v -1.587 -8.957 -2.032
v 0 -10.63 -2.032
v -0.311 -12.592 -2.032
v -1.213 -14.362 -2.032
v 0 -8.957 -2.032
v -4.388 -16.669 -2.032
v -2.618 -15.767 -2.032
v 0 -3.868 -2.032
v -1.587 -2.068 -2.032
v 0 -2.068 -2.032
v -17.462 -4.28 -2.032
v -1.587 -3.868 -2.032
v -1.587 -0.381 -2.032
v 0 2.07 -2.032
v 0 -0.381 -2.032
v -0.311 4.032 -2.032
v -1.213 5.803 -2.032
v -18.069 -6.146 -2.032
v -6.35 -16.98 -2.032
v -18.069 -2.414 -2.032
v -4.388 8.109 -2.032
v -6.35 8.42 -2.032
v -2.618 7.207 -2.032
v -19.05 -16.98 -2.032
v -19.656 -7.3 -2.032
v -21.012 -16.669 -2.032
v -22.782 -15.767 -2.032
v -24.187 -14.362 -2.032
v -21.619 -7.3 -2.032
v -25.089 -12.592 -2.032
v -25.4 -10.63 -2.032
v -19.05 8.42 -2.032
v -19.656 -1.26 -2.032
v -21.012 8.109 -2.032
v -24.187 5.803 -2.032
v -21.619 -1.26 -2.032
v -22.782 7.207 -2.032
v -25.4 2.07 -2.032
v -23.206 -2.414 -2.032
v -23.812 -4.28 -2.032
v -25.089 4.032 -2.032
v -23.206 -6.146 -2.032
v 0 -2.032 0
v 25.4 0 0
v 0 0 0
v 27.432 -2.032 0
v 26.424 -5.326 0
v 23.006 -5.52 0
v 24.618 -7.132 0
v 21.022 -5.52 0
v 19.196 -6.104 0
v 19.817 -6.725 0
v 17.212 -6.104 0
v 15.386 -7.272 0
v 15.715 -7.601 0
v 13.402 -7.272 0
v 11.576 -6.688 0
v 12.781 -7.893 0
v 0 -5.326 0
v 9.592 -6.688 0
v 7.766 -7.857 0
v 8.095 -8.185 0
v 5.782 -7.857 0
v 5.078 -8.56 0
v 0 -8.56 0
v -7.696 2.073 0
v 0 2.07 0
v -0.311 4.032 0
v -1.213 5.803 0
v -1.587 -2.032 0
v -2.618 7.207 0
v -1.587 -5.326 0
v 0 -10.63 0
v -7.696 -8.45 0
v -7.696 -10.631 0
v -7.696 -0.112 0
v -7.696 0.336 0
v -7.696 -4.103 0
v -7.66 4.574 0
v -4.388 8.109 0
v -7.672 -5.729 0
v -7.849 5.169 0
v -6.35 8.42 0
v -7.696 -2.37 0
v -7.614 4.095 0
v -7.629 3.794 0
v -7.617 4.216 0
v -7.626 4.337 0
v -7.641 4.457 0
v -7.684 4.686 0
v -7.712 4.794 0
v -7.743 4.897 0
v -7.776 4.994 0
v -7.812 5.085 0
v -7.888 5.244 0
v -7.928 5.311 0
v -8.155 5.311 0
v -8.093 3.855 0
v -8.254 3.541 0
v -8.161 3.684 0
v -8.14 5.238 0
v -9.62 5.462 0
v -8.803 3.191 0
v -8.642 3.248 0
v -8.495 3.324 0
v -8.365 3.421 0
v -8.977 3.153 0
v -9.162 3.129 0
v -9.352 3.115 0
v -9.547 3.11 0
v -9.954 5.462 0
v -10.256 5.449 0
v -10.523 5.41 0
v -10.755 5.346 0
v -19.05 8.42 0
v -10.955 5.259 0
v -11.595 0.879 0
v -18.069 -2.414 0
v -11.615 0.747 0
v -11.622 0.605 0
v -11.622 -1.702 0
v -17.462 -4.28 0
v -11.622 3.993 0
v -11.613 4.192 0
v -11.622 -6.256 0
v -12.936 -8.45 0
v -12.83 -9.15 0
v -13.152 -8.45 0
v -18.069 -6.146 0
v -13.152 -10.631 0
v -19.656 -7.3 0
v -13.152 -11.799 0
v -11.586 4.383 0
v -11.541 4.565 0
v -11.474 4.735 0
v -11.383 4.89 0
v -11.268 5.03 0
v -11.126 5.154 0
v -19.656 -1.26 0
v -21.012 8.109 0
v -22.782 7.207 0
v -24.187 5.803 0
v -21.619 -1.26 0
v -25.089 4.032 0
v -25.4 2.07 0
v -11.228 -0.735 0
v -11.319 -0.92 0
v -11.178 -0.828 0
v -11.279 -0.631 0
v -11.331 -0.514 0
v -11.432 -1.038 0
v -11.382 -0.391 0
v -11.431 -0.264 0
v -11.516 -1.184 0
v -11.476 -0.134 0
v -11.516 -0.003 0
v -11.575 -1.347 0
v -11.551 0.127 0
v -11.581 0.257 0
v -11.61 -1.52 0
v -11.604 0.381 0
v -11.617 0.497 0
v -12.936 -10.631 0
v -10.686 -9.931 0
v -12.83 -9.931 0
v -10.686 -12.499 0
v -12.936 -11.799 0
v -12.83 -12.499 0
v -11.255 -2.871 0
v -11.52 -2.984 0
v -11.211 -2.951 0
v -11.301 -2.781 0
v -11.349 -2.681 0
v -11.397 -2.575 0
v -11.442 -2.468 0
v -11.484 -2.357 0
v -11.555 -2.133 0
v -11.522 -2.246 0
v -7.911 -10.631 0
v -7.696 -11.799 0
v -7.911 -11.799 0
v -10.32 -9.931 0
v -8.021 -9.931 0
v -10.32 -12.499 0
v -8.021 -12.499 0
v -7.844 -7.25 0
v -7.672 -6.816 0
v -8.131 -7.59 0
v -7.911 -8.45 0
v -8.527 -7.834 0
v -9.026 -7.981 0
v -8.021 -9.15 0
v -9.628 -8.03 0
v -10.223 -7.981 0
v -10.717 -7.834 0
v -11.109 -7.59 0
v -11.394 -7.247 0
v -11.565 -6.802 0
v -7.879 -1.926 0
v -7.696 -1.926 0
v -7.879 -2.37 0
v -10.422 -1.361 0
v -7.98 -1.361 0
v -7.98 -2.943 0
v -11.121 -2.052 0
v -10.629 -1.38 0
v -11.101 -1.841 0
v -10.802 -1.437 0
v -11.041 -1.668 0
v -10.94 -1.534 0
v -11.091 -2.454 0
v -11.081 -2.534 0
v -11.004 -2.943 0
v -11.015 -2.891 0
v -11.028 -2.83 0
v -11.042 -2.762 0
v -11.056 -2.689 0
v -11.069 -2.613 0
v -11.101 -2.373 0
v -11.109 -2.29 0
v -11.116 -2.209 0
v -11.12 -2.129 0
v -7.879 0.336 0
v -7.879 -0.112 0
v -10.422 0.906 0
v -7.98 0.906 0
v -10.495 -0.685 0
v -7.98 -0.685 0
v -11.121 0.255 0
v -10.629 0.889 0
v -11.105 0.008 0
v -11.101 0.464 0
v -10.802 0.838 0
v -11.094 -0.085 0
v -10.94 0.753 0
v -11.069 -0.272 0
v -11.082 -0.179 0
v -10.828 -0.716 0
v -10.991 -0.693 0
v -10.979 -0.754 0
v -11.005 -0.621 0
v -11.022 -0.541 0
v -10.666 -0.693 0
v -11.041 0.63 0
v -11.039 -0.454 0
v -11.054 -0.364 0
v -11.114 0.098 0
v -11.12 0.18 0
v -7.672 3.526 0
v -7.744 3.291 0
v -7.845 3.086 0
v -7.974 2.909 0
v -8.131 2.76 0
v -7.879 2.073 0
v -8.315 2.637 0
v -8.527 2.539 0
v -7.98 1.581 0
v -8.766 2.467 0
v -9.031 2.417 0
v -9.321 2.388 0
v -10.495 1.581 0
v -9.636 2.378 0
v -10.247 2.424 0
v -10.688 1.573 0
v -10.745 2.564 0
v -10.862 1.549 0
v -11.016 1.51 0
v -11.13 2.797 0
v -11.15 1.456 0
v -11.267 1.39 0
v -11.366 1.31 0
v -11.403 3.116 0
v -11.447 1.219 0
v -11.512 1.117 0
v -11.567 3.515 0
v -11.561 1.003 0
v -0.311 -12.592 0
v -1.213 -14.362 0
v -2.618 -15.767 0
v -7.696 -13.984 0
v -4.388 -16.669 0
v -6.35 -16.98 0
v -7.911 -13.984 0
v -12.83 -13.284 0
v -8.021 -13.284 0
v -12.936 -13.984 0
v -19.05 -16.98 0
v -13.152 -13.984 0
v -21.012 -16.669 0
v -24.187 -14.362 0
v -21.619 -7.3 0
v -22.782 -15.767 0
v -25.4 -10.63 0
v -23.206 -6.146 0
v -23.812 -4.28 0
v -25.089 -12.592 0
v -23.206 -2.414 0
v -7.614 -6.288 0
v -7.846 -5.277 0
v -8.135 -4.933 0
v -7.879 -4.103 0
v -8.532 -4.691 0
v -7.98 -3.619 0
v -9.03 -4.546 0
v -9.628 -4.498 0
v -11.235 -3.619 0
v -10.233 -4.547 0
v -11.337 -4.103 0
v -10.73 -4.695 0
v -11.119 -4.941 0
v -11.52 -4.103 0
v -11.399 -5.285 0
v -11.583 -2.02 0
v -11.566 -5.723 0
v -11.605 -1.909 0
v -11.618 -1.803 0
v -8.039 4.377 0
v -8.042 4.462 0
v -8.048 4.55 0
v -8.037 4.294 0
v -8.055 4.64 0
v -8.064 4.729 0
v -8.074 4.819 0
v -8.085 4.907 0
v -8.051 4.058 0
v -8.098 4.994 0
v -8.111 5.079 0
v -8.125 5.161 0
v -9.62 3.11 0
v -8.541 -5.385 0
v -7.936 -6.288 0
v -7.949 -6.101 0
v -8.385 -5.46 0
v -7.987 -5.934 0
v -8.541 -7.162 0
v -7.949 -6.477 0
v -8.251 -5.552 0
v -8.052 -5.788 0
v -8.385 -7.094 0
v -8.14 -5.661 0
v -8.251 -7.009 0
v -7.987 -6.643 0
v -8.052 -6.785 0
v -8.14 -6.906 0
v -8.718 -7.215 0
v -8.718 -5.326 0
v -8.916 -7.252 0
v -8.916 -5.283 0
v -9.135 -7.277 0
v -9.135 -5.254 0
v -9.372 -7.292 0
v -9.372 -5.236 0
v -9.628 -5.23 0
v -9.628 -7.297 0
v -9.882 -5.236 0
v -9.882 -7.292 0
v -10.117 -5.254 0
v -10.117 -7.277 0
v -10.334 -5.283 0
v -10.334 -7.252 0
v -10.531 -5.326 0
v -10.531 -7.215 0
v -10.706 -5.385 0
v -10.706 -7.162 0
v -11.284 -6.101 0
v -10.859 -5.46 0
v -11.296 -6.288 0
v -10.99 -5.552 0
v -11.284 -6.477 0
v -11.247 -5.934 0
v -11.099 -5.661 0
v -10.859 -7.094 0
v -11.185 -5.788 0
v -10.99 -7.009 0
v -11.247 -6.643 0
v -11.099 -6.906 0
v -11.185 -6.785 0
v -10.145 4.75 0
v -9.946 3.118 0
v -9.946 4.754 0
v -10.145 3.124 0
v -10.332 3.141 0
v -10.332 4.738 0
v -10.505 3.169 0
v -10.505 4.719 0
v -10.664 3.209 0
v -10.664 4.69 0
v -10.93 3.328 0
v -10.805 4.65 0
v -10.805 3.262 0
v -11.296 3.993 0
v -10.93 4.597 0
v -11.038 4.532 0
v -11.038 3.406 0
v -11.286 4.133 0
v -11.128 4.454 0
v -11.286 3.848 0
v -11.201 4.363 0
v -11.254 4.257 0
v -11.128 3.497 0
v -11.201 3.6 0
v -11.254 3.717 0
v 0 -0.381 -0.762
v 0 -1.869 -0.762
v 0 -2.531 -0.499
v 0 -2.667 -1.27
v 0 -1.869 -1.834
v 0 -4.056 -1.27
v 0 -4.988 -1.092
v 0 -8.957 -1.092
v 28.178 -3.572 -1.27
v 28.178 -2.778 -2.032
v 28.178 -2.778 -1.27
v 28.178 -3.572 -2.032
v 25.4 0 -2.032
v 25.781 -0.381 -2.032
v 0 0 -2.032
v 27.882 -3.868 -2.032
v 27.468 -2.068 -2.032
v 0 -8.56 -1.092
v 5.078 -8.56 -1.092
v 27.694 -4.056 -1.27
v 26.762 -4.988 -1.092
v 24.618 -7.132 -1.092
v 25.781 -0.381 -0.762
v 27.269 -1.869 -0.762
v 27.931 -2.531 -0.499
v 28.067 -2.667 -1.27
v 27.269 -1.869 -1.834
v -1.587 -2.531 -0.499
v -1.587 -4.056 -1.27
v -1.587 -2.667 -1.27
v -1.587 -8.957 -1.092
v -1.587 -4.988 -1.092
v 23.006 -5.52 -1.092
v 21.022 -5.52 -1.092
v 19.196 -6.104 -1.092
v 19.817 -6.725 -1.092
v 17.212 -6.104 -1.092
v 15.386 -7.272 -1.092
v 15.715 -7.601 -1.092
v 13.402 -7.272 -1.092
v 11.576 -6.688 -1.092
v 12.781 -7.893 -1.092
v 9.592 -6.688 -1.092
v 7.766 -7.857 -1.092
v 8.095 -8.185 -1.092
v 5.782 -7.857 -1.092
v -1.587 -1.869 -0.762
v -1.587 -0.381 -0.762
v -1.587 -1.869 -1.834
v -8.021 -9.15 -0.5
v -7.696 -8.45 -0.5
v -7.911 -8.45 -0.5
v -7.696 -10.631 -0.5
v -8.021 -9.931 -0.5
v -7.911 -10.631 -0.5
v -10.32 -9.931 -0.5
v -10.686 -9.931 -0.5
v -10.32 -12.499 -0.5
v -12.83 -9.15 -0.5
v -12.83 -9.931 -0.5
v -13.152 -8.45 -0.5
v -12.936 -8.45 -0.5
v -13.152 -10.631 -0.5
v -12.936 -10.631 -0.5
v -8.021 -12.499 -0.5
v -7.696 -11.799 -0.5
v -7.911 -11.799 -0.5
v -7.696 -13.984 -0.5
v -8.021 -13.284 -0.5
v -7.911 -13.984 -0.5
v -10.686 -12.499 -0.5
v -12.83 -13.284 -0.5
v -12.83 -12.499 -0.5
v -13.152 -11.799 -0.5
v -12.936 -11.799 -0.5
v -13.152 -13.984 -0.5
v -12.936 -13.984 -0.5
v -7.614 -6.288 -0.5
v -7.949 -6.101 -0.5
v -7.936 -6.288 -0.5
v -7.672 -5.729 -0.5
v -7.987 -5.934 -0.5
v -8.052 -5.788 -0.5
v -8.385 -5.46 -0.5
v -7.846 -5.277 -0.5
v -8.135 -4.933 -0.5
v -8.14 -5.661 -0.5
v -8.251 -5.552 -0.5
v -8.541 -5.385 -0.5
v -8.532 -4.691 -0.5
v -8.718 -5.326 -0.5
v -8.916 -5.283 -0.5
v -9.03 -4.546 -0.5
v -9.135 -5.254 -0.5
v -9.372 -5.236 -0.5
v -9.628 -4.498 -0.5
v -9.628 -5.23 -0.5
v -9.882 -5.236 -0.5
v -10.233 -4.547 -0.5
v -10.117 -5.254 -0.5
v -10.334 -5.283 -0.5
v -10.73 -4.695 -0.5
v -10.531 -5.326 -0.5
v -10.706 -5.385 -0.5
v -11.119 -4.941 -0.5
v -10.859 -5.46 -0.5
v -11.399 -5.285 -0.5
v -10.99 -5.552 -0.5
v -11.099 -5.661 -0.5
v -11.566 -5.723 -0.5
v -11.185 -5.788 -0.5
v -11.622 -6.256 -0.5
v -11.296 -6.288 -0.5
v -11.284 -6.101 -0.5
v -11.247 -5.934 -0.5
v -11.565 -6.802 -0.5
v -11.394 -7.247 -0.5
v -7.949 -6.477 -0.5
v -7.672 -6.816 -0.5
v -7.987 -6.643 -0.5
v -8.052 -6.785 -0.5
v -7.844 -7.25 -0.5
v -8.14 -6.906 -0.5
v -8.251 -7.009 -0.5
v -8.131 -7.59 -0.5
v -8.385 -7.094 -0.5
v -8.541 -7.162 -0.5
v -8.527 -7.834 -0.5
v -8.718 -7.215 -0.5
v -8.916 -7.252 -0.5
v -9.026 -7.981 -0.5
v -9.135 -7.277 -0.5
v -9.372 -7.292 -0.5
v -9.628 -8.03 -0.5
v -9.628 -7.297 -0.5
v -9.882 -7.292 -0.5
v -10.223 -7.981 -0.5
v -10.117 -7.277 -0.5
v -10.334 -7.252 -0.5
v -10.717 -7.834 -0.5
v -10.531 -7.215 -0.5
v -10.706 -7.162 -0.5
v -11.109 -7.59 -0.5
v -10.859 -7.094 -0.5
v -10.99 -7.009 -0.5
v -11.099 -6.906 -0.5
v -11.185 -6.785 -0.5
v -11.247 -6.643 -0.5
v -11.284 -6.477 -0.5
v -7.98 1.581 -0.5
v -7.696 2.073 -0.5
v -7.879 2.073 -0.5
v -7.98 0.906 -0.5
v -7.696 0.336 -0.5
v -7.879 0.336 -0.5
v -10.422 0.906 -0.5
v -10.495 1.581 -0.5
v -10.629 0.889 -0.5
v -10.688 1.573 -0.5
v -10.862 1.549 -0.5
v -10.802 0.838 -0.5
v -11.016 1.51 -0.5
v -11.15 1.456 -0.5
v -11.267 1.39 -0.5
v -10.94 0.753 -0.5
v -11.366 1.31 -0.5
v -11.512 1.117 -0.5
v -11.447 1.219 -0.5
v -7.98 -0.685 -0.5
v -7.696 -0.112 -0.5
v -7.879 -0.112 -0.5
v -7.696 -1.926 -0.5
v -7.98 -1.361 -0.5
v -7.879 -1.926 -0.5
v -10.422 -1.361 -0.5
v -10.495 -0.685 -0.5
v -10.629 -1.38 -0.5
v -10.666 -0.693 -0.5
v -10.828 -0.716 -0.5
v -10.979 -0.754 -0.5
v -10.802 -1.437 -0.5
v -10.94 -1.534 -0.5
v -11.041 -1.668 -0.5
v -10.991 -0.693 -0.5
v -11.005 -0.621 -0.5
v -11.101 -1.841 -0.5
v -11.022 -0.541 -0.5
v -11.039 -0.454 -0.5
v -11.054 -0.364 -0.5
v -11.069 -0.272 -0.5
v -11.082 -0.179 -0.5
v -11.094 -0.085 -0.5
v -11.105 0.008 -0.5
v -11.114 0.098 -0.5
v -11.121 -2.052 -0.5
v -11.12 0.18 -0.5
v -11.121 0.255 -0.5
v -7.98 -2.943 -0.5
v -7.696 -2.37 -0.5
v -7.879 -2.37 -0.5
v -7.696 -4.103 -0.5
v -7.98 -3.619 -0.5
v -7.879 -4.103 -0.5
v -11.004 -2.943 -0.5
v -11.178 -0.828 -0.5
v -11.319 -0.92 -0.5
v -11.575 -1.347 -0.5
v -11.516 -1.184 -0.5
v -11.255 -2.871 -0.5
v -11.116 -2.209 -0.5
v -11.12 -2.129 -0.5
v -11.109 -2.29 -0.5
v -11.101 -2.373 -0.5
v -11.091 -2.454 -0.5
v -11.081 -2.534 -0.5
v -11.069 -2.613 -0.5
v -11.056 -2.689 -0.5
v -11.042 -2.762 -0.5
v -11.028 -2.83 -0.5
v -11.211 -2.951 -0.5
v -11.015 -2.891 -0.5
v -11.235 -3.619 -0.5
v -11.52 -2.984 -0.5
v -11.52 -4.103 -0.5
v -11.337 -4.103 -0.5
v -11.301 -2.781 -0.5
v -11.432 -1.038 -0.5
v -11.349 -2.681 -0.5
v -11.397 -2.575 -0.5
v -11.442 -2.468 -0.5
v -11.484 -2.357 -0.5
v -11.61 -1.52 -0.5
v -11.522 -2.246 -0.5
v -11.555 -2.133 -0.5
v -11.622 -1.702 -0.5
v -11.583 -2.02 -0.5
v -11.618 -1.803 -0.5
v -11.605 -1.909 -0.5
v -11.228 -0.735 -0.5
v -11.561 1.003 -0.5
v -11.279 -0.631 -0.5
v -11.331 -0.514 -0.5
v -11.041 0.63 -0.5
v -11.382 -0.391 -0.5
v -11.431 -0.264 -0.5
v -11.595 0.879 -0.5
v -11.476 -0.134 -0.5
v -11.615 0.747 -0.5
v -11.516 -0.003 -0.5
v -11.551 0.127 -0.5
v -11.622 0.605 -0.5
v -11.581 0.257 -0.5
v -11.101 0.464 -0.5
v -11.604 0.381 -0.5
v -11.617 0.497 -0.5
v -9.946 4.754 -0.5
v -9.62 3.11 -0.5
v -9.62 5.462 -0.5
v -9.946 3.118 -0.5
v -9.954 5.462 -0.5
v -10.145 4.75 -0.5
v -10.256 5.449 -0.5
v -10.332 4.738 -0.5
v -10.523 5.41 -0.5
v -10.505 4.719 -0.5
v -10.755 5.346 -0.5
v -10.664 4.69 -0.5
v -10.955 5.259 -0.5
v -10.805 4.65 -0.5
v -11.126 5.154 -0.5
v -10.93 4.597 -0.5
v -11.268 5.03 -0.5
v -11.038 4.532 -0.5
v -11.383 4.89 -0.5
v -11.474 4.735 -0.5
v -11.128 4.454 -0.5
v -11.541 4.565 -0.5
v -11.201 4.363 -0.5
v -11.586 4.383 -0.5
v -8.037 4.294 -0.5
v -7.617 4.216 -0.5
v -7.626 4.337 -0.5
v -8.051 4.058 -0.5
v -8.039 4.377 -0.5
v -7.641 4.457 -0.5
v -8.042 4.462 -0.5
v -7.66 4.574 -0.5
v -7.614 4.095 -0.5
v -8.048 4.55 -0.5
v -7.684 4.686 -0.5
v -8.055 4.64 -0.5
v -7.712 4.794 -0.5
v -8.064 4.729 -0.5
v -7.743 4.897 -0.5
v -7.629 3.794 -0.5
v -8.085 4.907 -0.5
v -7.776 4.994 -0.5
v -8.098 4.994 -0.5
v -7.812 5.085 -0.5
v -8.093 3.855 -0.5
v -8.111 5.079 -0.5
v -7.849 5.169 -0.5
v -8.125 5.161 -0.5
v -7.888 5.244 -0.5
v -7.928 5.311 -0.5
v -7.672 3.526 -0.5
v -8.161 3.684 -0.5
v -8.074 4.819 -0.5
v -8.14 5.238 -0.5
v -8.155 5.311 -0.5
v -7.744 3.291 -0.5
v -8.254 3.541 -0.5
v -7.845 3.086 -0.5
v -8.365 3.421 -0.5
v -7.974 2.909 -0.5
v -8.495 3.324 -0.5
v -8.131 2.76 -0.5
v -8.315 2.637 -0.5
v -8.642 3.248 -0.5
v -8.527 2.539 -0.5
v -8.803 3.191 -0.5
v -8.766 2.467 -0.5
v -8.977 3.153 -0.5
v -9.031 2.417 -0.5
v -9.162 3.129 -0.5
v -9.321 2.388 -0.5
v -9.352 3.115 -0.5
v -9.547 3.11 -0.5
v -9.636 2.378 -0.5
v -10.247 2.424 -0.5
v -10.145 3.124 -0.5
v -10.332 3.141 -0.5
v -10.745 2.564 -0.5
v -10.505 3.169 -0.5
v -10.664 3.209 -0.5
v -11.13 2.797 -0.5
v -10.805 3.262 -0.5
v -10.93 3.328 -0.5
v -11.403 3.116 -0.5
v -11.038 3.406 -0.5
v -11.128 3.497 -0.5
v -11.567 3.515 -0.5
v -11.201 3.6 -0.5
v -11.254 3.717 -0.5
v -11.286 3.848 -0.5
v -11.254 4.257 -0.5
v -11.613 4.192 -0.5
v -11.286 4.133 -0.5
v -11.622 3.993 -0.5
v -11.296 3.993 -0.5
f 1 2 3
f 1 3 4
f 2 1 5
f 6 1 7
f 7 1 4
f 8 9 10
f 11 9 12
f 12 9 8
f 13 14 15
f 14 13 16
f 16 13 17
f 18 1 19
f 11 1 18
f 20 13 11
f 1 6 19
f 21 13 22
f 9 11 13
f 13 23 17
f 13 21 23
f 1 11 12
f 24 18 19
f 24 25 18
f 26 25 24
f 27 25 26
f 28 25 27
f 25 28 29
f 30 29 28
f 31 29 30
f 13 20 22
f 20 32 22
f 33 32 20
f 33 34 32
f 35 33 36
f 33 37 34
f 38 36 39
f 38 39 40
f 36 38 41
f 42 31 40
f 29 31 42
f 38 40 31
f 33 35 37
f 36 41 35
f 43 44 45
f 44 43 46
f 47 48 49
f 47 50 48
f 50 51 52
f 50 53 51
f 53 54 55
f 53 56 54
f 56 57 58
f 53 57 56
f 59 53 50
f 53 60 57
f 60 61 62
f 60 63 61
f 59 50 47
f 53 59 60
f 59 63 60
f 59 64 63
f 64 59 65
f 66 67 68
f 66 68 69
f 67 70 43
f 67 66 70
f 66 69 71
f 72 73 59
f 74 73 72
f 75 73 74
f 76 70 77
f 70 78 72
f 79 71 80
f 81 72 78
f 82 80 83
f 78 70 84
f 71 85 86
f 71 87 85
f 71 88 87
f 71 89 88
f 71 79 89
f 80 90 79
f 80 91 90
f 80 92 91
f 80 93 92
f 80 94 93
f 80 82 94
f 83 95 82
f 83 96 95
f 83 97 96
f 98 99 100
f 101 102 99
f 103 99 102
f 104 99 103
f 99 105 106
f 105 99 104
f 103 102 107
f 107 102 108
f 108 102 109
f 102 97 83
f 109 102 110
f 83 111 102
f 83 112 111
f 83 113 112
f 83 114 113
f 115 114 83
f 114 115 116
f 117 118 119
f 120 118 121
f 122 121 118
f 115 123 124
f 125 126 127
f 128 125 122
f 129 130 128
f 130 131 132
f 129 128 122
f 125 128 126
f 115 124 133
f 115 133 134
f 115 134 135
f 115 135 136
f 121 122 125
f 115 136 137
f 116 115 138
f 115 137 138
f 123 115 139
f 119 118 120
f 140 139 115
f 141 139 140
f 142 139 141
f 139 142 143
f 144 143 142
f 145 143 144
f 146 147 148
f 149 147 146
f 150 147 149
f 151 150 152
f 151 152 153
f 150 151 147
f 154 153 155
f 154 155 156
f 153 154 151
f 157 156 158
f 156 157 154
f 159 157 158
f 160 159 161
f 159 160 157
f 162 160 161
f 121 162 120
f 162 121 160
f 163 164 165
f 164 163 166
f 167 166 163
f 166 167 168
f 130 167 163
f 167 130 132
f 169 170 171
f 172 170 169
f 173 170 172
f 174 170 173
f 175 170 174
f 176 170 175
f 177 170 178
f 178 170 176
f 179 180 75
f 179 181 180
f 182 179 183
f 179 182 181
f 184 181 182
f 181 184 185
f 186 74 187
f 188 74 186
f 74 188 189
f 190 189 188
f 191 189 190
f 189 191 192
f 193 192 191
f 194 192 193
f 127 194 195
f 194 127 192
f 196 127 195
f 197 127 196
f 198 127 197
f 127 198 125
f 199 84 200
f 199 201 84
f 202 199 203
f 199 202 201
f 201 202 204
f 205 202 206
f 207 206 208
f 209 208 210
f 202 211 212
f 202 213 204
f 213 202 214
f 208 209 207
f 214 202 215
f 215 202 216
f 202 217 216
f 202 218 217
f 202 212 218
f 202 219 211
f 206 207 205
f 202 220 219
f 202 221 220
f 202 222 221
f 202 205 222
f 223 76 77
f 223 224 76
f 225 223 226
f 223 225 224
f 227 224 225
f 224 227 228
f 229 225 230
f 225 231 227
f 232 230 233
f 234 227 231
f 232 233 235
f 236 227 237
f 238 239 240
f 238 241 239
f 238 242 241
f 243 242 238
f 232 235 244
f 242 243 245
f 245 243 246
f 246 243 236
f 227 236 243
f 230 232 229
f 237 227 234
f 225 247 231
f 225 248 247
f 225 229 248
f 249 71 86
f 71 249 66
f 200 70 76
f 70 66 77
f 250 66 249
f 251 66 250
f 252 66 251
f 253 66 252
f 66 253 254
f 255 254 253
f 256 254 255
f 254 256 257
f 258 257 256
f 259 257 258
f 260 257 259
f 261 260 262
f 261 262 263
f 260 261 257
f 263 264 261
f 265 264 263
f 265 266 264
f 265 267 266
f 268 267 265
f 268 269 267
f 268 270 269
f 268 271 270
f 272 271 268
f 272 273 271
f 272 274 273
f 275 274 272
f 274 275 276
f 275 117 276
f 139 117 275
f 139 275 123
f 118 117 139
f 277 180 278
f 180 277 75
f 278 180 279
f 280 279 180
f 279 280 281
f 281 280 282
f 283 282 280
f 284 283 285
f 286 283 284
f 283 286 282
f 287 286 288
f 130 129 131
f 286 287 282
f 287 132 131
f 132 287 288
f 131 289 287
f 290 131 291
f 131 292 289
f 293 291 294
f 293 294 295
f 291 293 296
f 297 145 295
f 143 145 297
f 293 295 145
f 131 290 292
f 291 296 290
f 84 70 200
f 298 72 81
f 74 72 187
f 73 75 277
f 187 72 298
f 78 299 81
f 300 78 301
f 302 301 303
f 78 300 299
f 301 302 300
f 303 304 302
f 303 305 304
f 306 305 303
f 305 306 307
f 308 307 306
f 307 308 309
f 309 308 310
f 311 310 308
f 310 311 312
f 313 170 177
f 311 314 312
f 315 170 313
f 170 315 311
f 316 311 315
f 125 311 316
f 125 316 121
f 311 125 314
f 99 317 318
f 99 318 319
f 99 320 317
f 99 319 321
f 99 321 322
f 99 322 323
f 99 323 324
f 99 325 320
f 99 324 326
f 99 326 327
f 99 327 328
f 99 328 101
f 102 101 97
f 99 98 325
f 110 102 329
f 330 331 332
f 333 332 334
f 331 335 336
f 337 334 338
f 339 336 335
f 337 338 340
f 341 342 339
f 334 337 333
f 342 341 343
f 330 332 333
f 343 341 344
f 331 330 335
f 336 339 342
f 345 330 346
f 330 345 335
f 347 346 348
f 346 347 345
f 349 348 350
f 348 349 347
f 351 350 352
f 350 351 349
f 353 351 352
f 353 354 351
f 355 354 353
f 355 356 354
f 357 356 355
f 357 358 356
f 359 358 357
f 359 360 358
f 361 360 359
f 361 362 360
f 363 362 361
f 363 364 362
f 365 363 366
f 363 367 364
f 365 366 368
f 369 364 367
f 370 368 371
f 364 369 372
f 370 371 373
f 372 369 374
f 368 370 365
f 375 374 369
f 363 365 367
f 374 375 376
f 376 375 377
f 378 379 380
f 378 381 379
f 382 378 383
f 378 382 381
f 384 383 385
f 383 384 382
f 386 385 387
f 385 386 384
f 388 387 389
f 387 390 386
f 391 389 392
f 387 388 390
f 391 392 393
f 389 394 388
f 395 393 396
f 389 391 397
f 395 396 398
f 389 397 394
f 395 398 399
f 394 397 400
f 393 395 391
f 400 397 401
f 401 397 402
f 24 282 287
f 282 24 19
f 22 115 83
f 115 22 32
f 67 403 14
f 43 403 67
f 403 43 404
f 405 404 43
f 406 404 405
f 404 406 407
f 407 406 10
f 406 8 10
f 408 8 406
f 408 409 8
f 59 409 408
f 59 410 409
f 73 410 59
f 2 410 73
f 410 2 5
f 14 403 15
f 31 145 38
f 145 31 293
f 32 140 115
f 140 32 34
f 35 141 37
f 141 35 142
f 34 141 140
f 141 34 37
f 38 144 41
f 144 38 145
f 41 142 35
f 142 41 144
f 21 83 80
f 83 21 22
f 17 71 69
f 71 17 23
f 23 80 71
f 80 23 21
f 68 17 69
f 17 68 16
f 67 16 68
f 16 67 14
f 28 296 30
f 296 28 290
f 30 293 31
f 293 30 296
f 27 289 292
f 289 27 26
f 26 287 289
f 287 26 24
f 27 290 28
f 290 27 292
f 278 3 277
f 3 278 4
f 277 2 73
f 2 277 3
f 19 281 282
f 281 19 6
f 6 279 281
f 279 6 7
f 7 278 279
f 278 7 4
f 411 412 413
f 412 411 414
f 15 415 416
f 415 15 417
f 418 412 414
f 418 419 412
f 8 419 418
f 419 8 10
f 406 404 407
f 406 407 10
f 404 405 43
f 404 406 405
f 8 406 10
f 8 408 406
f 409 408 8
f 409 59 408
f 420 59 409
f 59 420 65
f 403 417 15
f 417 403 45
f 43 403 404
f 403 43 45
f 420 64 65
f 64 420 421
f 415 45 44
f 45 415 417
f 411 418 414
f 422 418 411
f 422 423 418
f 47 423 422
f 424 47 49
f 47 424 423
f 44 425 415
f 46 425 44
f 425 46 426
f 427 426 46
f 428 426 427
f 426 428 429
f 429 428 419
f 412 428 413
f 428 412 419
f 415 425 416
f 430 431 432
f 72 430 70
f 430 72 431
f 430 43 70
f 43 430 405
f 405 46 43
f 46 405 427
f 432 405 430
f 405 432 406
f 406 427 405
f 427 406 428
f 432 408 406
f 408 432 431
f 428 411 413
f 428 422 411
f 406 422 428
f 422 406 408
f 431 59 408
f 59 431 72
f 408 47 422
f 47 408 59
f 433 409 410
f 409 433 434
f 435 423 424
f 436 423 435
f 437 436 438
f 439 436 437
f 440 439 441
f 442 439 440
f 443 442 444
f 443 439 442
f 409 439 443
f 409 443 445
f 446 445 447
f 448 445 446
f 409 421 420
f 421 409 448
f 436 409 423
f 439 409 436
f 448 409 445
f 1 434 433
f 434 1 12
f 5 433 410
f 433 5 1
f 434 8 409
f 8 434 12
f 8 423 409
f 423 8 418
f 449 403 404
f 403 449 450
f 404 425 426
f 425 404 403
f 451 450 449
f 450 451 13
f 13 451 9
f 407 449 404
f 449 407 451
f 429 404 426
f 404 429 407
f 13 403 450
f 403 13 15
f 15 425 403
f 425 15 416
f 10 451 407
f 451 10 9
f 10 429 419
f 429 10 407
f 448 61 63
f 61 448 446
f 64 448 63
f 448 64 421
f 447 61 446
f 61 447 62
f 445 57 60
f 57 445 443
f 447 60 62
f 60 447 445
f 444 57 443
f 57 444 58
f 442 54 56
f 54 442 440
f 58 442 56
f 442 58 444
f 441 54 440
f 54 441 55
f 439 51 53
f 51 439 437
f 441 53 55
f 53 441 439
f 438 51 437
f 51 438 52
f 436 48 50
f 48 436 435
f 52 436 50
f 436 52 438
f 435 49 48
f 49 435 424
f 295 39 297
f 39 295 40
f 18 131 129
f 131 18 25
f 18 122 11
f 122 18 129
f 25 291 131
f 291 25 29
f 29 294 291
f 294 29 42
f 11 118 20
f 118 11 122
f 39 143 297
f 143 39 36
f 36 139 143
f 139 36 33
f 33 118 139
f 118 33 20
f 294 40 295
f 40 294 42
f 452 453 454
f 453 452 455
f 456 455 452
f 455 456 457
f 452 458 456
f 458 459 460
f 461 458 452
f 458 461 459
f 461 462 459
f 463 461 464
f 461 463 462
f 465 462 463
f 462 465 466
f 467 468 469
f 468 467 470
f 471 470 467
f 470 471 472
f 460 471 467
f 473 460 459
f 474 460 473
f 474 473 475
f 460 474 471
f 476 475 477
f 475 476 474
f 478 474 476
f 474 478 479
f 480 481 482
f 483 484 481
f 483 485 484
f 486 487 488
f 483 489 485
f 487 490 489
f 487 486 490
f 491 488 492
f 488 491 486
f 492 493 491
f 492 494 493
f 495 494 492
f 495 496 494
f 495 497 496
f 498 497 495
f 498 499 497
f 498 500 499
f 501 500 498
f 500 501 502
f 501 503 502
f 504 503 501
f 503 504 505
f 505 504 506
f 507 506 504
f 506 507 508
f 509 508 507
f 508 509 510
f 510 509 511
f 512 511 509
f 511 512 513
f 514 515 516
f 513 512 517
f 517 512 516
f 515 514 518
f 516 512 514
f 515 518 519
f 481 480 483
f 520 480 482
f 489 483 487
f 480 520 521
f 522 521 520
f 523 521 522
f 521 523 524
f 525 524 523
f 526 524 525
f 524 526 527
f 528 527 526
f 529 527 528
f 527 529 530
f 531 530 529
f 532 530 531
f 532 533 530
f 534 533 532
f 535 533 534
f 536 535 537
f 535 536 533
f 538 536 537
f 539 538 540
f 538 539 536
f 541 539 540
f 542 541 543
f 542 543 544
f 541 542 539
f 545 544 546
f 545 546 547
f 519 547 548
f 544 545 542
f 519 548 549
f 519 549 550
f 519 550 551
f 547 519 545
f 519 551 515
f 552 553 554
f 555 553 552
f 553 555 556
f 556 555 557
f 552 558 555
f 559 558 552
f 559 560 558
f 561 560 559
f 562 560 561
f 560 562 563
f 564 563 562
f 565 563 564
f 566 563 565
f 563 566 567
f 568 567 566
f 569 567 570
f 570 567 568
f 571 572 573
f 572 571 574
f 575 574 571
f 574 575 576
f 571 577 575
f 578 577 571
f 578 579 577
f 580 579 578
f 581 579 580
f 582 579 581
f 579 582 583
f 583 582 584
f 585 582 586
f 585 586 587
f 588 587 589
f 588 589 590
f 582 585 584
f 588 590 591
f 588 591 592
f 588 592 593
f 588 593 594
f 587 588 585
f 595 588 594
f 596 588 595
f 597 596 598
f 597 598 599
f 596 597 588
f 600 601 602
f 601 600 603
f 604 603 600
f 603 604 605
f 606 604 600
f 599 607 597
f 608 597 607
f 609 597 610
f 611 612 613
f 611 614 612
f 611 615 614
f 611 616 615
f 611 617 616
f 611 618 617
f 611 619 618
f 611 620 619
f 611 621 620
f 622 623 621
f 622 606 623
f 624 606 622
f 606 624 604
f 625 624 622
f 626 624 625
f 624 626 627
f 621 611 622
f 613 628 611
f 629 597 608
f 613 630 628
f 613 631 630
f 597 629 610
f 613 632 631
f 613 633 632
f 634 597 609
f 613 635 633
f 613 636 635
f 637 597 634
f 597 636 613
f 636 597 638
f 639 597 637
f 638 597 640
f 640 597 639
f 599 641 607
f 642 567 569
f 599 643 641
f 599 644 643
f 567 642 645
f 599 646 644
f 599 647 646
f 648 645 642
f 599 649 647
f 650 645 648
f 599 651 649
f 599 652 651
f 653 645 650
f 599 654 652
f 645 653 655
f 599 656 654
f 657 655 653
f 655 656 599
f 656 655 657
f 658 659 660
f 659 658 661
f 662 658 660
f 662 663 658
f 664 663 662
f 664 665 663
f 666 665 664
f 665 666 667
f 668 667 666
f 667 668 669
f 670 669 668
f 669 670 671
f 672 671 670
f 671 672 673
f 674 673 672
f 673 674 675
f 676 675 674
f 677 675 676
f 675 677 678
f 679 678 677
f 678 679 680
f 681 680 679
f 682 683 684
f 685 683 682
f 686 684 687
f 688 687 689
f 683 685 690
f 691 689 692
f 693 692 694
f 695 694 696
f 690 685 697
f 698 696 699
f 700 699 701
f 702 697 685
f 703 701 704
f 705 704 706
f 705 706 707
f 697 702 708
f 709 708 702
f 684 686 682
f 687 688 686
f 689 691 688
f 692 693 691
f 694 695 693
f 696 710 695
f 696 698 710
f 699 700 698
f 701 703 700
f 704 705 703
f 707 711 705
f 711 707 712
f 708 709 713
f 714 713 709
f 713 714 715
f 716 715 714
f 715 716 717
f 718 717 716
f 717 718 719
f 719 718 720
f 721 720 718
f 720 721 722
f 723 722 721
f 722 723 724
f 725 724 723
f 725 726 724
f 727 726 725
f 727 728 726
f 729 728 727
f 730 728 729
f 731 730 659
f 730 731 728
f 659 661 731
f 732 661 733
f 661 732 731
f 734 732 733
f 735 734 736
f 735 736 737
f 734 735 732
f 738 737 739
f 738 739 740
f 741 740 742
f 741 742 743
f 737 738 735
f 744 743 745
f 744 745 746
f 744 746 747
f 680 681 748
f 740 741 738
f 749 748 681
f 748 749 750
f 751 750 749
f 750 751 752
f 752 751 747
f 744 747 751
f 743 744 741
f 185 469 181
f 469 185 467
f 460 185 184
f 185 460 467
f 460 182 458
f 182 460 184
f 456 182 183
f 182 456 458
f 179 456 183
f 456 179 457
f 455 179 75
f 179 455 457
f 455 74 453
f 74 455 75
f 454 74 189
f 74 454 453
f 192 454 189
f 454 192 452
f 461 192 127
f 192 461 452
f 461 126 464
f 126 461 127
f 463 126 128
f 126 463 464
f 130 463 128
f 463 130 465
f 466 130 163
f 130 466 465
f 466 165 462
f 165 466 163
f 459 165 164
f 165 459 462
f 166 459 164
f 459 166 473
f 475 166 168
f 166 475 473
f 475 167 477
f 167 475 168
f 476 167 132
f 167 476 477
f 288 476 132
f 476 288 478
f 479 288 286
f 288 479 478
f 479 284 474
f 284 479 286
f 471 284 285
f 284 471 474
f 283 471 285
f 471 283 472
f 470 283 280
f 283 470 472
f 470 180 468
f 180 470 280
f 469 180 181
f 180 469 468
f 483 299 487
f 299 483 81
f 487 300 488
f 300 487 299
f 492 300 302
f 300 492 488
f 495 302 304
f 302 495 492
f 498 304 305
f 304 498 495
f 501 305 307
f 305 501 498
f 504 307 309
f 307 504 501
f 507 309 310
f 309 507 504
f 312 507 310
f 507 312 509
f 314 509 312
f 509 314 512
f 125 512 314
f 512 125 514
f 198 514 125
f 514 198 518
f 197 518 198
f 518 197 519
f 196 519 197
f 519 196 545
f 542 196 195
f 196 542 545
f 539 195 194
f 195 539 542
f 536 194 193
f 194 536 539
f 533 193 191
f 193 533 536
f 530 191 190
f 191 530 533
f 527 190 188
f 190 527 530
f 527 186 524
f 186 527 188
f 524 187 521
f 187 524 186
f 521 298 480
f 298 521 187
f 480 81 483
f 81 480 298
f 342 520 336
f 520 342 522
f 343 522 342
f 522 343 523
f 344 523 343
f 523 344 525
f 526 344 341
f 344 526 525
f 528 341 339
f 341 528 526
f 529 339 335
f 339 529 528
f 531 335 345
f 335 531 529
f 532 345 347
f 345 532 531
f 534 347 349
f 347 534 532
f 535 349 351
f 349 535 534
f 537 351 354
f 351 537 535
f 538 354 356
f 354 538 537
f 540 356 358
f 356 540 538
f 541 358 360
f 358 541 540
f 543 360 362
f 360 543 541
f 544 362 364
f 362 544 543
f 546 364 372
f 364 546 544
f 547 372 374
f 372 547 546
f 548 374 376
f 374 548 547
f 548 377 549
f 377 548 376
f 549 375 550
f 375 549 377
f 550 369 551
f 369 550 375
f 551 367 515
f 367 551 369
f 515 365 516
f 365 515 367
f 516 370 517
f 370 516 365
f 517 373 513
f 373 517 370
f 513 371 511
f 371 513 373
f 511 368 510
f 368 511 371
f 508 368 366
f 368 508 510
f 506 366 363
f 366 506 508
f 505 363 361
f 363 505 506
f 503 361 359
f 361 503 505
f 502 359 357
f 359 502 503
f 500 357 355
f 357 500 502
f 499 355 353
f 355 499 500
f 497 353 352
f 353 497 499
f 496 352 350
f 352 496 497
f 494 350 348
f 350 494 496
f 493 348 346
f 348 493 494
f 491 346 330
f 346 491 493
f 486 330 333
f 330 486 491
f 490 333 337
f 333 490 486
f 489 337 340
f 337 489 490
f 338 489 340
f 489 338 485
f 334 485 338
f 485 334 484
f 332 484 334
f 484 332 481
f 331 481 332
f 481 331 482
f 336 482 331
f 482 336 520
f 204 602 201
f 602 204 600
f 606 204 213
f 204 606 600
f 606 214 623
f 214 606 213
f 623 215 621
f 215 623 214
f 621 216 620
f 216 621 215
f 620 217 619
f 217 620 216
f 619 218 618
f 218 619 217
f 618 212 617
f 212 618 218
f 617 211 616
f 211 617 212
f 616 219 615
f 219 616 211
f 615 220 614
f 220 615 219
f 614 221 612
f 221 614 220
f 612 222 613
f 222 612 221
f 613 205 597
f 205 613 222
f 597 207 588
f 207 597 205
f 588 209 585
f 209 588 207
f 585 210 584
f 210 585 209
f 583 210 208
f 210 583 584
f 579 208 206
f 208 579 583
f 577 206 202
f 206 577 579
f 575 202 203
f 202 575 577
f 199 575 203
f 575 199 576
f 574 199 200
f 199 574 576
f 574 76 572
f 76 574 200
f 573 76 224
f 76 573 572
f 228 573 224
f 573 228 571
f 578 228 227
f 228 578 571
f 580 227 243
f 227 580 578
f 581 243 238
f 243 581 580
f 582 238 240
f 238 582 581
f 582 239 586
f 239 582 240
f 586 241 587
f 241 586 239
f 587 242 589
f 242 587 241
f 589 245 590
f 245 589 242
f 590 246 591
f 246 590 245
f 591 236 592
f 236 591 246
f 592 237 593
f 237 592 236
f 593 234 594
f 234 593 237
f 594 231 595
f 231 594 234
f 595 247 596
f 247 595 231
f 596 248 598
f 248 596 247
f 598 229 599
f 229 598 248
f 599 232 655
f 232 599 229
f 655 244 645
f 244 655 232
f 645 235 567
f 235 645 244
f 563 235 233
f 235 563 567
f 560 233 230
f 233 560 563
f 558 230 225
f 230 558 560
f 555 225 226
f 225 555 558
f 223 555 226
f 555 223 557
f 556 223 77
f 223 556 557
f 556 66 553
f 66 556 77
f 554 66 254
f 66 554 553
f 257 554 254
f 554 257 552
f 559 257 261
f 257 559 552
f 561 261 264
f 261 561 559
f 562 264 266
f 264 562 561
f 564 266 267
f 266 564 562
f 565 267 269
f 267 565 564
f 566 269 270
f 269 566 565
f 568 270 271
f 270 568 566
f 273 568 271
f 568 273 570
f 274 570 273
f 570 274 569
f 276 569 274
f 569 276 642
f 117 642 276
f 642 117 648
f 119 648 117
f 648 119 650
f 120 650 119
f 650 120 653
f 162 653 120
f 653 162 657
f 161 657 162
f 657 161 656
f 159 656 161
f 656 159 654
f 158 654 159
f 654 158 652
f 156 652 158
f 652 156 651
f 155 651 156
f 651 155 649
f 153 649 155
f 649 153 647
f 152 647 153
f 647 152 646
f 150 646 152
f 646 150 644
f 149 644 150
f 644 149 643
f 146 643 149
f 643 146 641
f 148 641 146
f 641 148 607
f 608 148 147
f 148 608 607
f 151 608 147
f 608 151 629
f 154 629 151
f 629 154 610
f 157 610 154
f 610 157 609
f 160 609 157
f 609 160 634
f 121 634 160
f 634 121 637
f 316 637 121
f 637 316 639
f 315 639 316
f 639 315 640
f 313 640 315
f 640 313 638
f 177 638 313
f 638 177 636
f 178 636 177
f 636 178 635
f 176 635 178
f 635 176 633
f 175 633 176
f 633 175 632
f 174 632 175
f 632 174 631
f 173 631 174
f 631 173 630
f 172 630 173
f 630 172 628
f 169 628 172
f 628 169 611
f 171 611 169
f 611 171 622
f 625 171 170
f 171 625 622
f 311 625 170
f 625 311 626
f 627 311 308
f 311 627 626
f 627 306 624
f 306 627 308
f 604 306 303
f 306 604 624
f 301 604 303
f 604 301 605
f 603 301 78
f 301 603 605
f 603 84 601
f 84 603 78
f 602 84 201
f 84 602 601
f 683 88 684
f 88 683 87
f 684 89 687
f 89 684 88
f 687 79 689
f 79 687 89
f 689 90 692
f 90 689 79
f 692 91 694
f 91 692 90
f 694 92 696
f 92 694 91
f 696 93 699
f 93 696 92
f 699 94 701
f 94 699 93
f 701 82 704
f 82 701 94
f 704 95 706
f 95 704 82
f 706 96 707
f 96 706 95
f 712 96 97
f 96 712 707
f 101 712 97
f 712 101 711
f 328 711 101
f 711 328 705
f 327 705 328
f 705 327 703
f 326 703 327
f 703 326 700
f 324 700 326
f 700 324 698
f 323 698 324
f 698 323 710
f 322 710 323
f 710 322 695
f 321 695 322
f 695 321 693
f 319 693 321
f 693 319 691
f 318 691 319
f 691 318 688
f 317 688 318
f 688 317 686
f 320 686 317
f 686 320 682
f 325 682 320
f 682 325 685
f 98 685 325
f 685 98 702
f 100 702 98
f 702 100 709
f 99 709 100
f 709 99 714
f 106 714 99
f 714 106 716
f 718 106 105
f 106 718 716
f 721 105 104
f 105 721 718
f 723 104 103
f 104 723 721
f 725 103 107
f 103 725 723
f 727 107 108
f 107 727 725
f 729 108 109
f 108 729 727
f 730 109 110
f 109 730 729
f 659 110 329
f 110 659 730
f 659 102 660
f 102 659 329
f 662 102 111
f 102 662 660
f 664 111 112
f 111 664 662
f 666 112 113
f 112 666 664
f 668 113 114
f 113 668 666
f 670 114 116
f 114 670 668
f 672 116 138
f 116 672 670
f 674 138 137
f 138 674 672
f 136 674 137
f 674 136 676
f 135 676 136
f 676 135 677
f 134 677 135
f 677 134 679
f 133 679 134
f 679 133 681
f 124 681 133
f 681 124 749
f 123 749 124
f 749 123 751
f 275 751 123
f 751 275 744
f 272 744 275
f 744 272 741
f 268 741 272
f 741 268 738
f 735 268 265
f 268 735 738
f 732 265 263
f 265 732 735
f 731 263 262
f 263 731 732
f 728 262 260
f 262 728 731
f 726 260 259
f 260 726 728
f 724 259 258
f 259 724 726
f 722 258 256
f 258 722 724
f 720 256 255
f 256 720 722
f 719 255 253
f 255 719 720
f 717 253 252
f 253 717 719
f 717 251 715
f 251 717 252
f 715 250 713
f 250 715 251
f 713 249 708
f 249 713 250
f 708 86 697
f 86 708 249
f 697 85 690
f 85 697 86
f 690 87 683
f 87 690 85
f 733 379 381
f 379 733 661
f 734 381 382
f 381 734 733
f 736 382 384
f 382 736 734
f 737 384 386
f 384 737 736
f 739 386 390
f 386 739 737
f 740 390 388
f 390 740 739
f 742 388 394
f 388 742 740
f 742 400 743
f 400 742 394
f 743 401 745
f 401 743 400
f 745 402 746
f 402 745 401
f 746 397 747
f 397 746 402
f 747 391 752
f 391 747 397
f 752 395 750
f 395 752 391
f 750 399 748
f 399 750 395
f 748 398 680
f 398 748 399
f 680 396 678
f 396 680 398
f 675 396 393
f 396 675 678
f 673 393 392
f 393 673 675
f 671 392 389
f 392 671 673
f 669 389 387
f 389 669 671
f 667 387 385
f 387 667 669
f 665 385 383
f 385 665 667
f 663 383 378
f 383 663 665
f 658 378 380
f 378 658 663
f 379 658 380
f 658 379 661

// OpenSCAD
// Kwikset KW1 5 pin with label - by Chris Myers
// Based on Physical Keygen - by Nirav Patel <http://eclecti.cc>
//
// Generate a duplicate of a Kwikset KW1 key by editing the last line of the file
// and entering in the key code of the lock.  If you don't know the key code,
// you can measure the key and compare the numbers at:
// http://web.archive.org/web/20050217020917fw_/http://dlaco.com/spacing/tips.htm
//
// This work is licensed under a Creative Commons Attribution 3.0 Unported License.

// Since the keys and locks I have were all designed in imperial units, the
// constants in this file will be defined in inches.  The mm function
// allows us to retain the proper size for exporting a metric STL.

//1st number of key code (Handle)
a = 1;
//2nd number of key code
b = 3;
//3rd number of key code
c = 2;
//4th number of key code
d = 4;
//5th number of key code (Tip)
e = 5;

/* [Label] */
// will be embossed into the key
label = "Home";
//depth of the lettering
textDepth = 1;
// size of the font
textSize = 6;
// font to use
textFont = "Times"; // [Arial,Times,Helvetica,Courier,Futura]

function mm(i) = i*25.4;

module rounded(size, r) {
    union() {
        translate([r, 0, 0]) cube([size[0]-2*r, size[1], size[2]]);
        translate([0, r, 0]) cube([size[0], size[1]-2*r, size[2]]);
        translate([r, r, 0]) cylinder(h=size[2], r=r);
        translate([size[0]-r, r, 0]) cylinder(h=size[2], r=r);
        translate([r, size[1]-r, 0]) cylinder(h=size[2], r=r);
        translate([size[0]-r, size[1]-r, 0]) cylinder(h=size[2], r=r);
    }
}

module bit() {
    w = mm(1/4);
    difference() {
        translate([-w/2, 0, 0]) cube([w, mm(1), w]);
        translate([-mm(5/128), 0, 0]) rotate([0, 0, 135]) cube([w, w, w]);
        translate([mm(5/128), 0, 0]) rotate([0, 0, -45]) cube([w, w, w]);
    }
}

// Kwikset KW1 5 pin key.  The measurements are mostly guesses based on reverse
// engineering some keys I have and some publicly available information.
module kw1(bits) {
    // You may need to adjust these to fit your specific printer settings
    thickness = mm(0.080);
    length = mm(9/8);
    width = mm(.337);
    
    shoulder = mm(.247);
    pin_spacing = mm(.15);
    depth_inc = mm(.023);
    
    // A fudge factor.  Printing with your average RepRap, the bottom layer is
    // going to be squeezed larger than you want. You can make the pins
    // go slighly deeper by a fudge amount to make up for it if you aren't
    // adjusting for it elsewhere like Skeinforge or in your firmware.
    fudge = 0.5;
    
    // Handle size
    h_l = mm(1);
    h_w = mm(1);
    h_d = mm(1/16);
    difference() {
        // blade and key handle
        union() {
            translate([-h_l, -h_w/2 + width/2, 0]) rounded([h_l, h_w, thickness], mm(1/4));
            // cut a little off the tip to avoid going too long
            cube([length - mm(1/64), width, thickness]);
        }
        
        // chamfer the tip
        translate([length, mm(1/8), 0]) {
            rotate([0, 0, 45]) cube([10, 10, thickness]);
            rotate([0, 0, 225]) cube([10, 10, thickness]);
        }
        
        // put in a hole for keychain use
        translate([-h_l + mm(3/16), width/2, 0]) cylinder(h=thickness, r=mm(1/8));
		
		// write text on Key
        translate([-h_l / 2 + mm(3/16)/2, width/2, 1-fudge])
        rotate([180,0,-90])
        linear_extrude(height = textDepth)
        text(label, size = textSize, font = textFont, valign="center", halign="center");
        
        // cut the channels in the key.  designed more for printability than accuracy
        union() {
            translate([-h_d, mm(.105), mm(.025)]) rotate([225, 0, 0]) cube([length + h_d, width, width]);
            translate([-h_d, mm(.105), mm(.05)]) rotate([260, 0, 0]) cube([length + h_d, thickness/2, mm(1/32)]);
            translate([-h_d, mm(.105), 0]) cube([length + h_d, mm(7/128), mm(.05)]);
            translate([-h_d, mm(.105) + mm(7/128), mm(.05)]) rotate([225, 0, 0]) cube([length + h_d, mm(3/64), thickness]);
        }
        
        translate([-h_d, width - mm(9/64), mm(.043)]) {
            cube([length + h_d, width - (width - mm(10/64)), thickness]);
            rotate([50, 0, 0]) cube([length + h_d, width, thickness]);
        }
        
        union() {
            translate([-h_d, mm(0.015), mm(.03)]) cube([length + h_d, mm(15/256), thickness]);
            translate([-h_d, mm(0.015) + mm(13/256), thickness - mm(1/64)]) rotate([45, 0, 0]) cube([length + h_d, mm(1/16), mm(1/16)]);
        }
        
        // Do the actual bitting
        for (b = [0:4]) {
            // KW1 doesn't have a 0 value and instead has 1 start around .008" deep
            translate([shoulder + fudge + b*pin_spacing, width - mm(.008) - (bits[b] - 1)*depth_inc - fudge, 0]) bit();
        }
    }
}

// Flip the key over for easy printing
rotate([180, 0, 0]) kw1([a,b,c,d,e]);
